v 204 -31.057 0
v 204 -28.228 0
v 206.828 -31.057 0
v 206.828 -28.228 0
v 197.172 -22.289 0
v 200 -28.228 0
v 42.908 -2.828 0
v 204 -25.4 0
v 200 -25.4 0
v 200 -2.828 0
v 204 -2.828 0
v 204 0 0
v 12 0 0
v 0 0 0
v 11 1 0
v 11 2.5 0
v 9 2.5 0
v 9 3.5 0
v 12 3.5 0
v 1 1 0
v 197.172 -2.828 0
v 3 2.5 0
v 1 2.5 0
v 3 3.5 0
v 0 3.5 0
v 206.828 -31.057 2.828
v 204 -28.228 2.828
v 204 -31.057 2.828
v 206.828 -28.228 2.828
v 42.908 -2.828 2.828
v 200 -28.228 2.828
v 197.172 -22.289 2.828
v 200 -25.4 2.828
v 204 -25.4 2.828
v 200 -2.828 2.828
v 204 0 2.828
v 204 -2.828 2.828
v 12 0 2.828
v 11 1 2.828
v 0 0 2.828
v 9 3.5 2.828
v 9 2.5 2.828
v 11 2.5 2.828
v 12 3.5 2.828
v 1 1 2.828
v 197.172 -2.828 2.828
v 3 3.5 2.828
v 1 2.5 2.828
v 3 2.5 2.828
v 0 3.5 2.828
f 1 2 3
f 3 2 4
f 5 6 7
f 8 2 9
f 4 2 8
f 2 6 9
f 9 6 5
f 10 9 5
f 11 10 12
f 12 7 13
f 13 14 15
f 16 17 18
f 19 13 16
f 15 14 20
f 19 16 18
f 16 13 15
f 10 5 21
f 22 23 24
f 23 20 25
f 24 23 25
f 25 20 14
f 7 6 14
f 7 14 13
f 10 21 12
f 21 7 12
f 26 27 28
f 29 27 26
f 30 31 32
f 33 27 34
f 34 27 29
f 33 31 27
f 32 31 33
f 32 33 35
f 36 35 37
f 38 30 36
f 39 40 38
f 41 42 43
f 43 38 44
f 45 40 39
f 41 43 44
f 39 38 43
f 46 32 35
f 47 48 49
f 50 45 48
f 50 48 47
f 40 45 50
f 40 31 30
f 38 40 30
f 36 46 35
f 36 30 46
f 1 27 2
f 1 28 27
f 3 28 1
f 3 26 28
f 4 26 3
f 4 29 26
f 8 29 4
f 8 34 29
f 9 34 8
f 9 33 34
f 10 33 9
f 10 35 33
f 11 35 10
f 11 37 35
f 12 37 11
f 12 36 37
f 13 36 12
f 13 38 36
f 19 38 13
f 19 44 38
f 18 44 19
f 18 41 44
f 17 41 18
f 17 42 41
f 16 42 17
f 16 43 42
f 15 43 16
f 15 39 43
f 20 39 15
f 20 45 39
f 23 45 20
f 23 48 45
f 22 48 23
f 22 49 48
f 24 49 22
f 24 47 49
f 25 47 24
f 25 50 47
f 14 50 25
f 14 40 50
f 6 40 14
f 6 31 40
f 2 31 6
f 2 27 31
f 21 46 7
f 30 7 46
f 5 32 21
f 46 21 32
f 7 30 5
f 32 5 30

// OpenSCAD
/** Pegboard settings */
hole_size = 4;
hole_spacing = 25.4;
board_thickness = 4;


/** Led strip settings */
strip_width = 10;
thickness = 1;

peg_square_side = sqrt(pow(hole_size, 2)/2);
led_holder_width = strip_width+2*thickness;


module led_slot_profile() {  
   width = led_holder_width;
   height = 1.5;
   led_width = 6;
   grove_length = (strip_width - led_width)/2;
   polygon(points=[[0, 0], [width,0], [width, 2*thickness+height], 
    [strip_width-grove_length+thickness, 2*thickness+height], [width-grove_length-thickness,thickness+height],
    [width-thickness, thickness+height], [width-thickness, thickness],
    [thickness, thickness], [thickness, thickness+height], [thickness+grove_length, thickness+height],
    [thickness+grove_length, thickness*2+height],
    [0, thickness*2+height],
    
   ]);
    

}


module peg_fitting() {
   length = 200;
   height = hole_spacing+peg_square_side;
   peg_length = board_thickness;
   difference() {
     polygon(points = [
      [0, 0] 
      ,[length, -height]
      ,[length+peg_length, -height]
      ,[length+peg_length, -height-peg_square_side]
      ,[length+peg_length+peg_square_side, -height-peg_square_side]
      ,[length+peg_length+peg_square_side, -height]
      ,[length+peg_length, -height+peg_square_side]
      ,[length, -height+peg_square_side]

      ,[length, -peg_square_side]
      ,[length+peg_length, -peg_square_side]
      ,[length+peg_length, 0]
      ,[led_holder_width, 0]
      
     ]);
     
     polygon(points = [
       [length-peg_square_side, -peg_square_side]
       ,[length-peg_square_side, -height+2*peg_square_side+2*height/length]
       ,[peg_square_side*(1 + 2*length/height), -peg_square_side]
     ]);
   }
}



linear_extrude(peg_square_side) {
    led_slot_profile();
    peg_fitting();
}
  
